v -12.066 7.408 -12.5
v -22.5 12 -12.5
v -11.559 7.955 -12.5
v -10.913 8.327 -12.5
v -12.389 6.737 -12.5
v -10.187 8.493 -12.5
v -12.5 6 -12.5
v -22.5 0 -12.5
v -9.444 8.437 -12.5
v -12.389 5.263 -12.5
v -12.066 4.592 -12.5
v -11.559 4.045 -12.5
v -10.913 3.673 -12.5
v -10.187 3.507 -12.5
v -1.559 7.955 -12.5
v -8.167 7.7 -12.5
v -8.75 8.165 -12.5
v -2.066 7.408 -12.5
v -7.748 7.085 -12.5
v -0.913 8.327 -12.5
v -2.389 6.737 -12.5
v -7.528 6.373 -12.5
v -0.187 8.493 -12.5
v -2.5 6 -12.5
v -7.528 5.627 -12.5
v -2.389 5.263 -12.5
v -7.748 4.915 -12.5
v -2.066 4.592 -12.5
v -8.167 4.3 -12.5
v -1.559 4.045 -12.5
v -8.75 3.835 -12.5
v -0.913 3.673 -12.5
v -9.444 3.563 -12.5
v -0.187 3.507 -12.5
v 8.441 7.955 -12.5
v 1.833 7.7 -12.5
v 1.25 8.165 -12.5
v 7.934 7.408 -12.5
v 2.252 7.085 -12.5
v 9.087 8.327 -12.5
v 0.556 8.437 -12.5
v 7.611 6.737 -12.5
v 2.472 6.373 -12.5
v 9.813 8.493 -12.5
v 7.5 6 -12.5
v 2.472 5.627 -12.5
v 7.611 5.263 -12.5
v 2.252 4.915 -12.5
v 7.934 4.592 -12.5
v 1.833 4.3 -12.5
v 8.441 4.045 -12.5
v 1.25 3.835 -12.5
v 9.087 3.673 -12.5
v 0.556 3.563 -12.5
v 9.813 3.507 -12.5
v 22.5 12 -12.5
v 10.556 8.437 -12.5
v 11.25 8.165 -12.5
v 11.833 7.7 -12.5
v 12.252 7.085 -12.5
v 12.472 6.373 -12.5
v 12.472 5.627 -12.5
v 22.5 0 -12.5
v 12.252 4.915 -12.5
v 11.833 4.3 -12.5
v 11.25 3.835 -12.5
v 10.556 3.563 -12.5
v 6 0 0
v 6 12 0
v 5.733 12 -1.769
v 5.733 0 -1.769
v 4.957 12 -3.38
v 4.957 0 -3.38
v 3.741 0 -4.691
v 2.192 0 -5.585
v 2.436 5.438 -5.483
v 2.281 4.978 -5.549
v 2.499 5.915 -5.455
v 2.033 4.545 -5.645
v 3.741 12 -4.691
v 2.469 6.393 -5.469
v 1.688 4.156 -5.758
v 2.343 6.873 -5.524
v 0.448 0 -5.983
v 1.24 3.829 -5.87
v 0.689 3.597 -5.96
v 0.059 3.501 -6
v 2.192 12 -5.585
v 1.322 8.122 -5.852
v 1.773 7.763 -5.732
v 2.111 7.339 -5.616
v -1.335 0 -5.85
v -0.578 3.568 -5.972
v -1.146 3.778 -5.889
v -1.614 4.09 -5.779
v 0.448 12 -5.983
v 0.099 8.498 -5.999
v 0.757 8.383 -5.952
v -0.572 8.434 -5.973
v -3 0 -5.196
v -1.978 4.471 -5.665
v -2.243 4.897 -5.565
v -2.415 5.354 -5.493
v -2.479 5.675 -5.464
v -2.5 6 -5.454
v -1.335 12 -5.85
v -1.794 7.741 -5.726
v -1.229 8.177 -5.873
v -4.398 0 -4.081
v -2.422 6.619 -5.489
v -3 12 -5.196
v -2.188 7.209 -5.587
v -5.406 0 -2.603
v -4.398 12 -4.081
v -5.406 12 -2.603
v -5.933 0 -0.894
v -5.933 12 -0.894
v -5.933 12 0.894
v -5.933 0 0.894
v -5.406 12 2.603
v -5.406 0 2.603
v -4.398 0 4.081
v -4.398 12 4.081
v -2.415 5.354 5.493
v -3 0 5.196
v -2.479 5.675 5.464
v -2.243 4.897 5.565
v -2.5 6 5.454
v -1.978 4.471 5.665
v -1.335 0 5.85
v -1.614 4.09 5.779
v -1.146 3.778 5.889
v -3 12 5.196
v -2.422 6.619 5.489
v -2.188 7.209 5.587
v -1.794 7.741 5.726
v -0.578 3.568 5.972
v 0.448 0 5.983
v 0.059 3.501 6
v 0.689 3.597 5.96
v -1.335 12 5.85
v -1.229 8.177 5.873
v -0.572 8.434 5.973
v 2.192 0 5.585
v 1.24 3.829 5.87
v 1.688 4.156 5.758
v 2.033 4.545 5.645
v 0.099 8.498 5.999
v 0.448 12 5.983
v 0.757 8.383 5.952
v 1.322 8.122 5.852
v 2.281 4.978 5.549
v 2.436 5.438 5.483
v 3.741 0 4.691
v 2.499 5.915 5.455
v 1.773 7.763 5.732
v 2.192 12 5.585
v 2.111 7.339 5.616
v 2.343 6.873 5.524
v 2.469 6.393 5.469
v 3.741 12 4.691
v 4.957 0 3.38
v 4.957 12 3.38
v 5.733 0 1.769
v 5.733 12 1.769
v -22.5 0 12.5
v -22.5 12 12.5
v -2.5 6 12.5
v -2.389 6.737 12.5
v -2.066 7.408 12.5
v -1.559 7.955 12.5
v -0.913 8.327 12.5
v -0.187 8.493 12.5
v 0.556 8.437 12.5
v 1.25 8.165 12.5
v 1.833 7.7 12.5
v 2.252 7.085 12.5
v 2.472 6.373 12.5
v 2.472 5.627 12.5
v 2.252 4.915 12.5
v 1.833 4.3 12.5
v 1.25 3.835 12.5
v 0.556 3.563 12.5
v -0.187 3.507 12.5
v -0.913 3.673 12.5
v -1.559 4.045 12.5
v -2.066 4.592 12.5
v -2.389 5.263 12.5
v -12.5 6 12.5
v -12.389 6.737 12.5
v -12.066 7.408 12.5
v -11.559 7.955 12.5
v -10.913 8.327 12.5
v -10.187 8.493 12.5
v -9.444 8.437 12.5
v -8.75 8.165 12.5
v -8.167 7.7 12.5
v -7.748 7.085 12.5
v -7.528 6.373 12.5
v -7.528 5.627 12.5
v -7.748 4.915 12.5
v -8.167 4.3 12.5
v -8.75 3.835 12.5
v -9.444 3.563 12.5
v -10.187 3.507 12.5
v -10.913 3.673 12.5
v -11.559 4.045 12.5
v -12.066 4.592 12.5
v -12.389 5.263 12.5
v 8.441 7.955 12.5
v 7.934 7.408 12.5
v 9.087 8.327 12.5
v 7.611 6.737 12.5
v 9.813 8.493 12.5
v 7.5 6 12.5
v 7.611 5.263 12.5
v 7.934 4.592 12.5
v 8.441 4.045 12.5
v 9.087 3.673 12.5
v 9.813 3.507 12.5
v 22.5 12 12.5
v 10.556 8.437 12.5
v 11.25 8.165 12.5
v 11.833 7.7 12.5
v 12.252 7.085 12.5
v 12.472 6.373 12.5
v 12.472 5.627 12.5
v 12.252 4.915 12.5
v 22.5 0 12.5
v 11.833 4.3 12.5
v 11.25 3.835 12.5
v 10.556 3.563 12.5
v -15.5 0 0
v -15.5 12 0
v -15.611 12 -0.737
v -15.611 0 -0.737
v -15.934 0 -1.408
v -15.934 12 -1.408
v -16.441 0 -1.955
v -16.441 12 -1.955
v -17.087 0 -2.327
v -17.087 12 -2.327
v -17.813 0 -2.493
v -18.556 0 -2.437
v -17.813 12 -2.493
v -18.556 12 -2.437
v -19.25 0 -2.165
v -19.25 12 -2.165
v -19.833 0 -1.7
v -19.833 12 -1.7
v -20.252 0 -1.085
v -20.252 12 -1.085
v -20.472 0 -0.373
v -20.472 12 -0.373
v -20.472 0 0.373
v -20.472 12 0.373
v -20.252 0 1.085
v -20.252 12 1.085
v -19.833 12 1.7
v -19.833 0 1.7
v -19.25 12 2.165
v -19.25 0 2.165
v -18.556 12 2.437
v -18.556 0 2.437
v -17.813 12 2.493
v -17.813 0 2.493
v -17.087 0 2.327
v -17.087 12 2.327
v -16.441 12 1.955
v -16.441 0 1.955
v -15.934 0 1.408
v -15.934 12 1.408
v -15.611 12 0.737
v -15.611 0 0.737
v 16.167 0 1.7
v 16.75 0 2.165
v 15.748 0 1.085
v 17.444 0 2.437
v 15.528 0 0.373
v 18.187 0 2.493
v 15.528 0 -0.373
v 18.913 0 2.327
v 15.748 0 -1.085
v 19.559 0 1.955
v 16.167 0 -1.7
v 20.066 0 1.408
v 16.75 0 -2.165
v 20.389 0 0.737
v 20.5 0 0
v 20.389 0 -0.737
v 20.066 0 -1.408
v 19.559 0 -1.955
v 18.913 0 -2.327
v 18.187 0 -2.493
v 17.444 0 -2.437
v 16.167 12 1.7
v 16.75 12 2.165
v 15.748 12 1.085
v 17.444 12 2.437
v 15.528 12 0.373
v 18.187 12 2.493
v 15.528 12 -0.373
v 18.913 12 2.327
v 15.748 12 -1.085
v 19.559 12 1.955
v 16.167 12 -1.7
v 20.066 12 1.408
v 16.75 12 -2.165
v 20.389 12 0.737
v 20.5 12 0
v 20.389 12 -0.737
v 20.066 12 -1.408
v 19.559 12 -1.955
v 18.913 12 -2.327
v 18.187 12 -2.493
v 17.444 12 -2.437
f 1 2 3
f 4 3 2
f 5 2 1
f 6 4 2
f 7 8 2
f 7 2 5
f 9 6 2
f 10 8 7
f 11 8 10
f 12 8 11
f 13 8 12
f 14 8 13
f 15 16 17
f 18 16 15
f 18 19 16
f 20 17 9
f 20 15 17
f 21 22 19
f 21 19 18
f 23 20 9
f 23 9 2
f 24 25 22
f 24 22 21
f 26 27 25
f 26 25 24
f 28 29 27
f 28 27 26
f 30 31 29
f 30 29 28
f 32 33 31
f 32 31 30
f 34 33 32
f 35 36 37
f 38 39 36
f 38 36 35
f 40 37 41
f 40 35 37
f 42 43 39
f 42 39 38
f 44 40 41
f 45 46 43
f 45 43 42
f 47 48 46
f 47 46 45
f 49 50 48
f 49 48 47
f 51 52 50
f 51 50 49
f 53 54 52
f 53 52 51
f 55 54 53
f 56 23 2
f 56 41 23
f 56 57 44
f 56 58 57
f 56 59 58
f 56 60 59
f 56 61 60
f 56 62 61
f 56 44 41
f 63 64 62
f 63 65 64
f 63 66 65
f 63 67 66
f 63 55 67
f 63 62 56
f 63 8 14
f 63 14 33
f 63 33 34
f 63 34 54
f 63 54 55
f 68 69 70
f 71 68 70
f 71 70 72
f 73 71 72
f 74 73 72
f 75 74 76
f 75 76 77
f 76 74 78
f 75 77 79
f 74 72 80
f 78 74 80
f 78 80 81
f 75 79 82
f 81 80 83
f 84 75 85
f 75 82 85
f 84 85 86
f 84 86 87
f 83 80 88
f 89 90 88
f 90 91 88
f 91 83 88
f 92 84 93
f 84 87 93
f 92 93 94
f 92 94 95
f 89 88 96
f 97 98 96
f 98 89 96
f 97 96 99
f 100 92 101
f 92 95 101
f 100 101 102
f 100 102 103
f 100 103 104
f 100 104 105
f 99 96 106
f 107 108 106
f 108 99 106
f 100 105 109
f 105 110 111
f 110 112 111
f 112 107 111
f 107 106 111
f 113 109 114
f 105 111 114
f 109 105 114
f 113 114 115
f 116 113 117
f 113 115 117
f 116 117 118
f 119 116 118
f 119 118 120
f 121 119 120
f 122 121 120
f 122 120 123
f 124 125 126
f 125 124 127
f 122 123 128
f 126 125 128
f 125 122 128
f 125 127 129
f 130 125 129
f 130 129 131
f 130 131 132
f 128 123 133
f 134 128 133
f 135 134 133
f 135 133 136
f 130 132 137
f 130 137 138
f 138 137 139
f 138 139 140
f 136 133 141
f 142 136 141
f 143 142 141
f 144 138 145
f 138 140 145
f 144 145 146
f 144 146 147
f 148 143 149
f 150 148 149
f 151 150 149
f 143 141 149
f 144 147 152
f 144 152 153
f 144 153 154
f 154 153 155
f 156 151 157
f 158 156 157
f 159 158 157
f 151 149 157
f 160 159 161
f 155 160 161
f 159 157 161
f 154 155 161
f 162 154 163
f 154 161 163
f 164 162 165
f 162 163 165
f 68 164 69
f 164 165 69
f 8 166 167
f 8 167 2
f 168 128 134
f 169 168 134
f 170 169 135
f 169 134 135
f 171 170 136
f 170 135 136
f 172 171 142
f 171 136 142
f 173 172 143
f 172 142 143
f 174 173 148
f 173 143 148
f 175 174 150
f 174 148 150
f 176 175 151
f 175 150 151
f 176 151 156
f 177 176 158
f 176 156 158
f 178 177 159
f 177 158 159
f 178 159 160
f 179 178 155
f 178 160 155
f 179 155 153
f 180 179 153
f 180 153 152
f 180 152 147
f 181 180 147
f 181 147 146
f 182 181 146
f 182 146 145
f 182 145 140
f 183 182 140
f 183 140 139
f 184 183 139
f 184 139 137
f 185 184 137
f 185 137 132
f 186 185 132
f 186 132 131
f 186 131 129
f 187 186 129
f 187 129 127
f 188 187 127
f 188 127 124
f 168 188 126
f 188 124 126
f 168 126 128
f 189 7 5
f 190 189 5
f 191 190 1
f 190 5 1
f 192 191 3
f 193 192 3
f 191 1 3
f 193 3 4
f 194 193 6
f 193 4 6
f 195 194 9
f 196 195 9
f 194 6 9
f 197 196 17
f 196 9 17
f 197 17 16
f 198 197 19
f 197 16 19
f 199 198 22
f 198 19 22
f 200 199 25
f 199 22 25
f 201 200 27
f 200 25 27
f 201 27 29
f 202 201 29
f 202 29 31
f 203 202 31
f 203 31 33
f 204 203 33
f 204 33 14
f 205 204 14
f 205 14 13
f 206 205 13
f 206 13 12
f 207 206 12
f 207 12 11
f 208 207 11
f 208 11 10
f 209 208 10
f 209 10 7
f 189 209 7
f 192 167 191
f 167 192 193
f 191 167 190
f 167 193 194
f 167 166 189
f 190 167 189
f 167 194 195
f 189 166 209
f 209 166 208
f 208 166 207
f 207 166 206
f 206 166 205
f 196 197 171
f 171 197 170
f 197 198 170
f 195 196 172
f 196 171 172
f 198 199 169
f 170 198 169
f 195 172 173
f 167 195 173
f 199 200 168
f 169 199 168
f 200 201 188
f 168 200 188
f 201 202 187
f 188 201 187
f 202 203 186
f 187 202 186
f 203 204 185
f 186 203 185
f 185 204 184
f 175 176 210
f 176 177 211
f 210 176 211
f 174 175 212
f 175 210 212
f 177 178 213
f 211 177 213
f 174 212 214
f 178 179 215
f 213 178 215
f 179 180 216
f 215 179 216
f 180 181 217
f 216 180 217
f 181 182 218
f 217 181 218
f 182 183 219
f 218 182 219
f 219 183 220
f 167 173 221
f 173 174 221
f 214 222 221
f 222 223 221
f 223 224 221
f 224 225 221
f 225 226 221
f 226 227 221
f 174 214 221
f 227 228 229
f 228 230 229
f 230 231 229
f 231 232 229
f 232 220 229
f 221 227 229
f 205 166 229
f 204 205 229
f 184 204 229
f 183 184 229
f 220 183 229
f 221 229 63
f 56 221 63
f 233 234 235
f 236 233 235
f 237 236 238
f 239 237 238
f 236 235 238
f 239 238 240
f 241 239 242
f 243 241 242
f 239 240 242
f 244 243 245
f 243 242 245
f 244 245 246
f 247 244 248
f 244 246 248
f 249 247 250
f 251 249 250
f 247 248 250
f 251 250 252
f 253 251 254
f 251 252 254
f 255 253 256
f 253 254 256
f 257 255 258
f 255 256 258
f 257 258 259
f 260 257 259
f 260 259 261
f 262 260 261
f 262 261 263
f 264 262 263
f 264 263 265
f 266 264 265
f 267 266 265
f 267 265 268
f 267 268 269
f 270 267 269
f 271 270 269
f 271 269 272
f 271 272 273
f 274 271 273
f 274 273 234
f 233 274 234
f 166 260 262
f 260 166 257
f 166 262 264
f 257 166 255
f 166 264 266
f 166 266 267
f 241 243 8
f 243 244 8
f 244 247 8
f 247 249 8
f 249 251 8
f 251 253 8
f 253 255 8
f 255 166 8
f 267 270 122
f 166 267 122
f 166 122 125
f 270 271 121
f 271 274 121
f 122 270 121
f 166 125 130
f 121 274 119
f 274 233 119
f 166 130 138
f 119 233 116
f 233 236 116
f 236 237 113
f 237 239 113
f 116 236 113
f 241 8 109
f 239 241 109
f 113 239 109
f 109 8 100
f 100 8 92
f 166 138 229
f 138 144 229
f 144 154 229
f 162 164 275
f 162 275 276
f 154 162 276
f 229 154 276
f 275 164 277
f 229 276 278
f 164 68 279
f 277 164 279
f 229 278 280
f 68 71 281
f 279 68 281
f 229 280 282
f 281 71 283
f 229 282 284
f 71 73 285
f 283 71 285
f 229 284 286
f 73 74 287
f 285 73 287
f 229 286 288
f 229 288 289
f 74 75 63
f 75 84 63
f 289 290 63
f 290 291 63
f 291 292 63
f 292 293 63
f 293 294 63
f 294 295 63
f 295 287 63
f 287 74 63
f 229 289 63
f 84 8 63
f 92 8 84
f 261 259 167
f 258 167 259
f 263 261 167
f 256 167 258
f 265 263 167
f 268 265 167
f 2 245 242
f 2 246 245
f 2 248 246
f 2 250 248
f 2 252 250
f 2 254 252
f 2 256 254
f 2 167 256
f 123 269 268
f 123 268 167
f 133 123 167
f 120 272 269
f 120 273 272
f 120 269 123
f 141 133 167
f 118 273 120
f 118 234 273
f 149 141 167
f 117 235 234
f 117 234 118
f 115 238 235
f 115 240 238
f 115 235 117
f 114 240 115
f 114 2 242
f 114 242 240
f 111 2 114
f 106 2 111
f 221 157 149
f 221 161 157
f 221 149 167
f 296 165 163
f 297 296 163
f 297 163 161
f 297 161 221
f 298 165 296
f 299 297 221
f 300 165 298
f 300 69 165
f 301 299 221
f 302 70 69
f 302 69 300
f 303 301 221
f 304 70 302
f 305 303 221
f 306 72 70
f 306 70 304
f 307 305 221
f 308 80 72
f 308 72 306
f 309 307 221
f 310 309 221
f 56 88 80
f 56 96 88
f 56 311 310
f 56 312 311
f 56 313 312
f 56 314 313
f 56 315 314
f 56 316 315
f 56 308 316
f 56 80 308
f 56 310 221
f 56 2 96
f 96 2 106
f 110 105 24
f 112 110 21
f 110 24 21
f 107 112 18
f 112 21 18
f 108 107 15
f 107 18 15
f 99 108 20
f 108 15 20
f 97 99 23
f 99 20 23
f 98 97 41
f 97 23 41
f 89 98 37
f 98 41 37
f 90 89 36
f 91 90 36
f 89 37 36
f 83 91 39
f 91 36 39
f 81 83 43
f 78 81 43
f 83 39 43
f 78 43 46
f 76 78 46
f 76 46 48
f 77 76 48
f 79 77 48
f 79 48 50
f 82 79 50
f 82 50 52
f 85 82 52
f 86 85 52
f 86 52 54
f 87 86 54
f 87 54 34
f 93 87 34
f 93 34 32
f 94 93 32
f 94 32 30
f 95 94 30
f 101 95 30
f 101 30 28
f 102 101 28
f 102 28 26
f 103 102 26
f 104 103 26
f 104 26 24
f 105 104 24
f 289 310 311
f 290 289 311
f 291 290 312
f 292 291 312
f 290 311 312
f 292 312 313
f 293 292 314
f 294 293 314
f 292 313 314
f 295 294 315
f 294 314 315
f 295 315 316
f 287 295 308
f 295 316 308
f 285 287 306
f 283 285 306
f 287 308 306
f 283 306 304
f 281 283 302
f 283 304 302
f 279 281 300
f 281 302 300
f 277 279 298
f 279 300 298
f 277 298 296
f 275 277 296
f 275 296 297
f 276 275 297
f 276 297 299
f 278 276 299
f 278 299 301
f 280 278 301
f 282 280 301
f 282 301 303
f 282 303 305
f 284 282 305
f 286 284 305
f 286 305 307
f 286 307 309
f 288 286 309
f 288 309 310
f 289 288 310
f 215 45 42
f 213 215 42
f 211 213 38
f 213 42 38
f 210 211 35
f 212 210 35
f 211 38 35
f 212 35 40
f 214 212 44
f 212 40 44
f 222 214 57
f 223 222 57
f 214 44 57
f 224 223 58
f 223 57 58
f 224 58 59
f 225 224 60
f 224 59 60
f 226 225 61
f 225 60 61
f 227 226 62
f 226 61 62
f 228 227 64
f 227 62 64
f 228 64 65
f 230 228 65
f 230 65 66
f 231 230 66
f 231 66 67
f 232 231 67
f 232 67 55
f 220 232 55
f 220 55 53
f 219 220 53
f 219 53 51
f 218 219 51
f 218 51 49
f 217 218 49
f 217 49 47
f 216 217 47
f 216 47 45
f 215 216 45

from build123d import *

# Parameters (mm, degrees)
SKETCH1_W           = 45
SKETCH1_H           = 25
BOSS_EXTRUDE1_DEPTH = 12
SKETCH2_R           = 2.5
CUT_EXTRUDE1_DEPTH  = 12
SKETCH3_R           = 2.5
CUT_EXTRUDE2_DEPTH  = 72
SKETCH4_R           = 2.5
CUT_EXTRUDE3_DEPTH  = 72
SKETCH5_R           = 6
CUT_EXTRUDE4_DEPTH  = 72
SKETCH6_R           = 2.5
CUT_EXTRUDE5_DEPTH  = 72
SKETCH7_R           = 2.5
BOSS_EXTRUDE2_DEPTH = 12


with BuildPart() as part:
    # Sketch1 → Boss-Extrude1 (new body)
    with BuildSketch(Plane(origin=(0, 0, 0), x_dir=(1, 0, 0), z_dir=(0, 1, 0))):
        Rectangle(SKETCH1_W, SKETCH1_H)
    extrude(amount=BOSS_EXTRUDE1_DEPTH)

    # Sketch2 → Cut-Extrude1 (cut)
    with BuildSketch(Plane(origin=(0, 12, 0), x_dir=(1, 0, 0), z_dir=(0, 1, 0))):
        with Locations((-18, -7.5)):
            Circle(SKETCH2_R)
        with Locations((-18, 7.5)):
            Circle(SKETCH2_R)
        with Locations((18, -7.5)):
            Circle(SKETCH2_R)
        with Locations((18, 7.5)):
            Circle(SKETCH2_R)
    extrude(amount=-CUT_EXTRUDE1_DEPTH, mode=Mode.SUBTRACT)

    # Sketch3 → Cut-Extrude2 (cut)
    with BuildSketch(Plane(origin=(0, 0, -12.5), x_dir=(-1, 0, 0), z_dir=(0, 0, -1))):
        with Locations((0, 6)):
            Circle(SKETCH3_R)
    extrude(amount=-CUT_EXTRUDE2_DEPTH, mode=Mode.SUBTRACT)

    # Sketch4 → Cut-Extrude3 (cut)
    with BuildSketch(Plane(origin=(0, 0, -12.5), x_dir=(-1, 0, 0), z_dir=(0, 0, -1))):
        with Locations((10, 6)):
            Circle(SKETCH4_R)
        with Locations((-10, 6)):
            Circle(SKETCH4_R)
    extrude(amount=-CUT_EXTRUDE3_DEPTH, mode=Mode.SUBTRACT)

    # Sketch5 → Cut-Extrude4 (cut)
    with BuildSketch(Plane(origin=(0, 12, 0), x_dir=(1, 0, 0), z_dir=(0, 1, 0))):
        Circle(SKETCH5_R)
    extrude(amount=-CUT_EXTRUDE4_DEPTH, mode=Mode.SUBTRACT)

    # Sketch6 → Cut-Extrude5 (cut)
    with BuildSketch(Plane(origin=(0, 12, 0), x_dir=(1, 0, 0), z_dir=(0, 1, 0))):
        with Locations((-18, 0)):
            Circle(SKETCH6_R)
        with Locations((18, 0)):
            Circle(SKETCH6_R)
    extrude(amount=-CUT_EXTRUDE5_DEPTH, mode=Mode.SUBTRACT)

    # Sketch7 → Boss-Extrude2 (add)
    with BuildSketch(Plane(origin=(0, 12, 0), x_dir=(1, 0, 0), z_dir=(0, 1, 0))):
        with Locations((18, -7.5)):
            Circle(SKETCH7_R)
        with Locations((18, 7.5)):
            Circle(SKETCH7_R)
        with Locations((-18, -7.5)):
            Circle(SKETCH7_R)
        with Locations((-18, 7.5)):
            Circle(SKETCH7_R)
    extrude(amount=-BOSS_EXTRUDE2_DEPTH)


solid = part.part
